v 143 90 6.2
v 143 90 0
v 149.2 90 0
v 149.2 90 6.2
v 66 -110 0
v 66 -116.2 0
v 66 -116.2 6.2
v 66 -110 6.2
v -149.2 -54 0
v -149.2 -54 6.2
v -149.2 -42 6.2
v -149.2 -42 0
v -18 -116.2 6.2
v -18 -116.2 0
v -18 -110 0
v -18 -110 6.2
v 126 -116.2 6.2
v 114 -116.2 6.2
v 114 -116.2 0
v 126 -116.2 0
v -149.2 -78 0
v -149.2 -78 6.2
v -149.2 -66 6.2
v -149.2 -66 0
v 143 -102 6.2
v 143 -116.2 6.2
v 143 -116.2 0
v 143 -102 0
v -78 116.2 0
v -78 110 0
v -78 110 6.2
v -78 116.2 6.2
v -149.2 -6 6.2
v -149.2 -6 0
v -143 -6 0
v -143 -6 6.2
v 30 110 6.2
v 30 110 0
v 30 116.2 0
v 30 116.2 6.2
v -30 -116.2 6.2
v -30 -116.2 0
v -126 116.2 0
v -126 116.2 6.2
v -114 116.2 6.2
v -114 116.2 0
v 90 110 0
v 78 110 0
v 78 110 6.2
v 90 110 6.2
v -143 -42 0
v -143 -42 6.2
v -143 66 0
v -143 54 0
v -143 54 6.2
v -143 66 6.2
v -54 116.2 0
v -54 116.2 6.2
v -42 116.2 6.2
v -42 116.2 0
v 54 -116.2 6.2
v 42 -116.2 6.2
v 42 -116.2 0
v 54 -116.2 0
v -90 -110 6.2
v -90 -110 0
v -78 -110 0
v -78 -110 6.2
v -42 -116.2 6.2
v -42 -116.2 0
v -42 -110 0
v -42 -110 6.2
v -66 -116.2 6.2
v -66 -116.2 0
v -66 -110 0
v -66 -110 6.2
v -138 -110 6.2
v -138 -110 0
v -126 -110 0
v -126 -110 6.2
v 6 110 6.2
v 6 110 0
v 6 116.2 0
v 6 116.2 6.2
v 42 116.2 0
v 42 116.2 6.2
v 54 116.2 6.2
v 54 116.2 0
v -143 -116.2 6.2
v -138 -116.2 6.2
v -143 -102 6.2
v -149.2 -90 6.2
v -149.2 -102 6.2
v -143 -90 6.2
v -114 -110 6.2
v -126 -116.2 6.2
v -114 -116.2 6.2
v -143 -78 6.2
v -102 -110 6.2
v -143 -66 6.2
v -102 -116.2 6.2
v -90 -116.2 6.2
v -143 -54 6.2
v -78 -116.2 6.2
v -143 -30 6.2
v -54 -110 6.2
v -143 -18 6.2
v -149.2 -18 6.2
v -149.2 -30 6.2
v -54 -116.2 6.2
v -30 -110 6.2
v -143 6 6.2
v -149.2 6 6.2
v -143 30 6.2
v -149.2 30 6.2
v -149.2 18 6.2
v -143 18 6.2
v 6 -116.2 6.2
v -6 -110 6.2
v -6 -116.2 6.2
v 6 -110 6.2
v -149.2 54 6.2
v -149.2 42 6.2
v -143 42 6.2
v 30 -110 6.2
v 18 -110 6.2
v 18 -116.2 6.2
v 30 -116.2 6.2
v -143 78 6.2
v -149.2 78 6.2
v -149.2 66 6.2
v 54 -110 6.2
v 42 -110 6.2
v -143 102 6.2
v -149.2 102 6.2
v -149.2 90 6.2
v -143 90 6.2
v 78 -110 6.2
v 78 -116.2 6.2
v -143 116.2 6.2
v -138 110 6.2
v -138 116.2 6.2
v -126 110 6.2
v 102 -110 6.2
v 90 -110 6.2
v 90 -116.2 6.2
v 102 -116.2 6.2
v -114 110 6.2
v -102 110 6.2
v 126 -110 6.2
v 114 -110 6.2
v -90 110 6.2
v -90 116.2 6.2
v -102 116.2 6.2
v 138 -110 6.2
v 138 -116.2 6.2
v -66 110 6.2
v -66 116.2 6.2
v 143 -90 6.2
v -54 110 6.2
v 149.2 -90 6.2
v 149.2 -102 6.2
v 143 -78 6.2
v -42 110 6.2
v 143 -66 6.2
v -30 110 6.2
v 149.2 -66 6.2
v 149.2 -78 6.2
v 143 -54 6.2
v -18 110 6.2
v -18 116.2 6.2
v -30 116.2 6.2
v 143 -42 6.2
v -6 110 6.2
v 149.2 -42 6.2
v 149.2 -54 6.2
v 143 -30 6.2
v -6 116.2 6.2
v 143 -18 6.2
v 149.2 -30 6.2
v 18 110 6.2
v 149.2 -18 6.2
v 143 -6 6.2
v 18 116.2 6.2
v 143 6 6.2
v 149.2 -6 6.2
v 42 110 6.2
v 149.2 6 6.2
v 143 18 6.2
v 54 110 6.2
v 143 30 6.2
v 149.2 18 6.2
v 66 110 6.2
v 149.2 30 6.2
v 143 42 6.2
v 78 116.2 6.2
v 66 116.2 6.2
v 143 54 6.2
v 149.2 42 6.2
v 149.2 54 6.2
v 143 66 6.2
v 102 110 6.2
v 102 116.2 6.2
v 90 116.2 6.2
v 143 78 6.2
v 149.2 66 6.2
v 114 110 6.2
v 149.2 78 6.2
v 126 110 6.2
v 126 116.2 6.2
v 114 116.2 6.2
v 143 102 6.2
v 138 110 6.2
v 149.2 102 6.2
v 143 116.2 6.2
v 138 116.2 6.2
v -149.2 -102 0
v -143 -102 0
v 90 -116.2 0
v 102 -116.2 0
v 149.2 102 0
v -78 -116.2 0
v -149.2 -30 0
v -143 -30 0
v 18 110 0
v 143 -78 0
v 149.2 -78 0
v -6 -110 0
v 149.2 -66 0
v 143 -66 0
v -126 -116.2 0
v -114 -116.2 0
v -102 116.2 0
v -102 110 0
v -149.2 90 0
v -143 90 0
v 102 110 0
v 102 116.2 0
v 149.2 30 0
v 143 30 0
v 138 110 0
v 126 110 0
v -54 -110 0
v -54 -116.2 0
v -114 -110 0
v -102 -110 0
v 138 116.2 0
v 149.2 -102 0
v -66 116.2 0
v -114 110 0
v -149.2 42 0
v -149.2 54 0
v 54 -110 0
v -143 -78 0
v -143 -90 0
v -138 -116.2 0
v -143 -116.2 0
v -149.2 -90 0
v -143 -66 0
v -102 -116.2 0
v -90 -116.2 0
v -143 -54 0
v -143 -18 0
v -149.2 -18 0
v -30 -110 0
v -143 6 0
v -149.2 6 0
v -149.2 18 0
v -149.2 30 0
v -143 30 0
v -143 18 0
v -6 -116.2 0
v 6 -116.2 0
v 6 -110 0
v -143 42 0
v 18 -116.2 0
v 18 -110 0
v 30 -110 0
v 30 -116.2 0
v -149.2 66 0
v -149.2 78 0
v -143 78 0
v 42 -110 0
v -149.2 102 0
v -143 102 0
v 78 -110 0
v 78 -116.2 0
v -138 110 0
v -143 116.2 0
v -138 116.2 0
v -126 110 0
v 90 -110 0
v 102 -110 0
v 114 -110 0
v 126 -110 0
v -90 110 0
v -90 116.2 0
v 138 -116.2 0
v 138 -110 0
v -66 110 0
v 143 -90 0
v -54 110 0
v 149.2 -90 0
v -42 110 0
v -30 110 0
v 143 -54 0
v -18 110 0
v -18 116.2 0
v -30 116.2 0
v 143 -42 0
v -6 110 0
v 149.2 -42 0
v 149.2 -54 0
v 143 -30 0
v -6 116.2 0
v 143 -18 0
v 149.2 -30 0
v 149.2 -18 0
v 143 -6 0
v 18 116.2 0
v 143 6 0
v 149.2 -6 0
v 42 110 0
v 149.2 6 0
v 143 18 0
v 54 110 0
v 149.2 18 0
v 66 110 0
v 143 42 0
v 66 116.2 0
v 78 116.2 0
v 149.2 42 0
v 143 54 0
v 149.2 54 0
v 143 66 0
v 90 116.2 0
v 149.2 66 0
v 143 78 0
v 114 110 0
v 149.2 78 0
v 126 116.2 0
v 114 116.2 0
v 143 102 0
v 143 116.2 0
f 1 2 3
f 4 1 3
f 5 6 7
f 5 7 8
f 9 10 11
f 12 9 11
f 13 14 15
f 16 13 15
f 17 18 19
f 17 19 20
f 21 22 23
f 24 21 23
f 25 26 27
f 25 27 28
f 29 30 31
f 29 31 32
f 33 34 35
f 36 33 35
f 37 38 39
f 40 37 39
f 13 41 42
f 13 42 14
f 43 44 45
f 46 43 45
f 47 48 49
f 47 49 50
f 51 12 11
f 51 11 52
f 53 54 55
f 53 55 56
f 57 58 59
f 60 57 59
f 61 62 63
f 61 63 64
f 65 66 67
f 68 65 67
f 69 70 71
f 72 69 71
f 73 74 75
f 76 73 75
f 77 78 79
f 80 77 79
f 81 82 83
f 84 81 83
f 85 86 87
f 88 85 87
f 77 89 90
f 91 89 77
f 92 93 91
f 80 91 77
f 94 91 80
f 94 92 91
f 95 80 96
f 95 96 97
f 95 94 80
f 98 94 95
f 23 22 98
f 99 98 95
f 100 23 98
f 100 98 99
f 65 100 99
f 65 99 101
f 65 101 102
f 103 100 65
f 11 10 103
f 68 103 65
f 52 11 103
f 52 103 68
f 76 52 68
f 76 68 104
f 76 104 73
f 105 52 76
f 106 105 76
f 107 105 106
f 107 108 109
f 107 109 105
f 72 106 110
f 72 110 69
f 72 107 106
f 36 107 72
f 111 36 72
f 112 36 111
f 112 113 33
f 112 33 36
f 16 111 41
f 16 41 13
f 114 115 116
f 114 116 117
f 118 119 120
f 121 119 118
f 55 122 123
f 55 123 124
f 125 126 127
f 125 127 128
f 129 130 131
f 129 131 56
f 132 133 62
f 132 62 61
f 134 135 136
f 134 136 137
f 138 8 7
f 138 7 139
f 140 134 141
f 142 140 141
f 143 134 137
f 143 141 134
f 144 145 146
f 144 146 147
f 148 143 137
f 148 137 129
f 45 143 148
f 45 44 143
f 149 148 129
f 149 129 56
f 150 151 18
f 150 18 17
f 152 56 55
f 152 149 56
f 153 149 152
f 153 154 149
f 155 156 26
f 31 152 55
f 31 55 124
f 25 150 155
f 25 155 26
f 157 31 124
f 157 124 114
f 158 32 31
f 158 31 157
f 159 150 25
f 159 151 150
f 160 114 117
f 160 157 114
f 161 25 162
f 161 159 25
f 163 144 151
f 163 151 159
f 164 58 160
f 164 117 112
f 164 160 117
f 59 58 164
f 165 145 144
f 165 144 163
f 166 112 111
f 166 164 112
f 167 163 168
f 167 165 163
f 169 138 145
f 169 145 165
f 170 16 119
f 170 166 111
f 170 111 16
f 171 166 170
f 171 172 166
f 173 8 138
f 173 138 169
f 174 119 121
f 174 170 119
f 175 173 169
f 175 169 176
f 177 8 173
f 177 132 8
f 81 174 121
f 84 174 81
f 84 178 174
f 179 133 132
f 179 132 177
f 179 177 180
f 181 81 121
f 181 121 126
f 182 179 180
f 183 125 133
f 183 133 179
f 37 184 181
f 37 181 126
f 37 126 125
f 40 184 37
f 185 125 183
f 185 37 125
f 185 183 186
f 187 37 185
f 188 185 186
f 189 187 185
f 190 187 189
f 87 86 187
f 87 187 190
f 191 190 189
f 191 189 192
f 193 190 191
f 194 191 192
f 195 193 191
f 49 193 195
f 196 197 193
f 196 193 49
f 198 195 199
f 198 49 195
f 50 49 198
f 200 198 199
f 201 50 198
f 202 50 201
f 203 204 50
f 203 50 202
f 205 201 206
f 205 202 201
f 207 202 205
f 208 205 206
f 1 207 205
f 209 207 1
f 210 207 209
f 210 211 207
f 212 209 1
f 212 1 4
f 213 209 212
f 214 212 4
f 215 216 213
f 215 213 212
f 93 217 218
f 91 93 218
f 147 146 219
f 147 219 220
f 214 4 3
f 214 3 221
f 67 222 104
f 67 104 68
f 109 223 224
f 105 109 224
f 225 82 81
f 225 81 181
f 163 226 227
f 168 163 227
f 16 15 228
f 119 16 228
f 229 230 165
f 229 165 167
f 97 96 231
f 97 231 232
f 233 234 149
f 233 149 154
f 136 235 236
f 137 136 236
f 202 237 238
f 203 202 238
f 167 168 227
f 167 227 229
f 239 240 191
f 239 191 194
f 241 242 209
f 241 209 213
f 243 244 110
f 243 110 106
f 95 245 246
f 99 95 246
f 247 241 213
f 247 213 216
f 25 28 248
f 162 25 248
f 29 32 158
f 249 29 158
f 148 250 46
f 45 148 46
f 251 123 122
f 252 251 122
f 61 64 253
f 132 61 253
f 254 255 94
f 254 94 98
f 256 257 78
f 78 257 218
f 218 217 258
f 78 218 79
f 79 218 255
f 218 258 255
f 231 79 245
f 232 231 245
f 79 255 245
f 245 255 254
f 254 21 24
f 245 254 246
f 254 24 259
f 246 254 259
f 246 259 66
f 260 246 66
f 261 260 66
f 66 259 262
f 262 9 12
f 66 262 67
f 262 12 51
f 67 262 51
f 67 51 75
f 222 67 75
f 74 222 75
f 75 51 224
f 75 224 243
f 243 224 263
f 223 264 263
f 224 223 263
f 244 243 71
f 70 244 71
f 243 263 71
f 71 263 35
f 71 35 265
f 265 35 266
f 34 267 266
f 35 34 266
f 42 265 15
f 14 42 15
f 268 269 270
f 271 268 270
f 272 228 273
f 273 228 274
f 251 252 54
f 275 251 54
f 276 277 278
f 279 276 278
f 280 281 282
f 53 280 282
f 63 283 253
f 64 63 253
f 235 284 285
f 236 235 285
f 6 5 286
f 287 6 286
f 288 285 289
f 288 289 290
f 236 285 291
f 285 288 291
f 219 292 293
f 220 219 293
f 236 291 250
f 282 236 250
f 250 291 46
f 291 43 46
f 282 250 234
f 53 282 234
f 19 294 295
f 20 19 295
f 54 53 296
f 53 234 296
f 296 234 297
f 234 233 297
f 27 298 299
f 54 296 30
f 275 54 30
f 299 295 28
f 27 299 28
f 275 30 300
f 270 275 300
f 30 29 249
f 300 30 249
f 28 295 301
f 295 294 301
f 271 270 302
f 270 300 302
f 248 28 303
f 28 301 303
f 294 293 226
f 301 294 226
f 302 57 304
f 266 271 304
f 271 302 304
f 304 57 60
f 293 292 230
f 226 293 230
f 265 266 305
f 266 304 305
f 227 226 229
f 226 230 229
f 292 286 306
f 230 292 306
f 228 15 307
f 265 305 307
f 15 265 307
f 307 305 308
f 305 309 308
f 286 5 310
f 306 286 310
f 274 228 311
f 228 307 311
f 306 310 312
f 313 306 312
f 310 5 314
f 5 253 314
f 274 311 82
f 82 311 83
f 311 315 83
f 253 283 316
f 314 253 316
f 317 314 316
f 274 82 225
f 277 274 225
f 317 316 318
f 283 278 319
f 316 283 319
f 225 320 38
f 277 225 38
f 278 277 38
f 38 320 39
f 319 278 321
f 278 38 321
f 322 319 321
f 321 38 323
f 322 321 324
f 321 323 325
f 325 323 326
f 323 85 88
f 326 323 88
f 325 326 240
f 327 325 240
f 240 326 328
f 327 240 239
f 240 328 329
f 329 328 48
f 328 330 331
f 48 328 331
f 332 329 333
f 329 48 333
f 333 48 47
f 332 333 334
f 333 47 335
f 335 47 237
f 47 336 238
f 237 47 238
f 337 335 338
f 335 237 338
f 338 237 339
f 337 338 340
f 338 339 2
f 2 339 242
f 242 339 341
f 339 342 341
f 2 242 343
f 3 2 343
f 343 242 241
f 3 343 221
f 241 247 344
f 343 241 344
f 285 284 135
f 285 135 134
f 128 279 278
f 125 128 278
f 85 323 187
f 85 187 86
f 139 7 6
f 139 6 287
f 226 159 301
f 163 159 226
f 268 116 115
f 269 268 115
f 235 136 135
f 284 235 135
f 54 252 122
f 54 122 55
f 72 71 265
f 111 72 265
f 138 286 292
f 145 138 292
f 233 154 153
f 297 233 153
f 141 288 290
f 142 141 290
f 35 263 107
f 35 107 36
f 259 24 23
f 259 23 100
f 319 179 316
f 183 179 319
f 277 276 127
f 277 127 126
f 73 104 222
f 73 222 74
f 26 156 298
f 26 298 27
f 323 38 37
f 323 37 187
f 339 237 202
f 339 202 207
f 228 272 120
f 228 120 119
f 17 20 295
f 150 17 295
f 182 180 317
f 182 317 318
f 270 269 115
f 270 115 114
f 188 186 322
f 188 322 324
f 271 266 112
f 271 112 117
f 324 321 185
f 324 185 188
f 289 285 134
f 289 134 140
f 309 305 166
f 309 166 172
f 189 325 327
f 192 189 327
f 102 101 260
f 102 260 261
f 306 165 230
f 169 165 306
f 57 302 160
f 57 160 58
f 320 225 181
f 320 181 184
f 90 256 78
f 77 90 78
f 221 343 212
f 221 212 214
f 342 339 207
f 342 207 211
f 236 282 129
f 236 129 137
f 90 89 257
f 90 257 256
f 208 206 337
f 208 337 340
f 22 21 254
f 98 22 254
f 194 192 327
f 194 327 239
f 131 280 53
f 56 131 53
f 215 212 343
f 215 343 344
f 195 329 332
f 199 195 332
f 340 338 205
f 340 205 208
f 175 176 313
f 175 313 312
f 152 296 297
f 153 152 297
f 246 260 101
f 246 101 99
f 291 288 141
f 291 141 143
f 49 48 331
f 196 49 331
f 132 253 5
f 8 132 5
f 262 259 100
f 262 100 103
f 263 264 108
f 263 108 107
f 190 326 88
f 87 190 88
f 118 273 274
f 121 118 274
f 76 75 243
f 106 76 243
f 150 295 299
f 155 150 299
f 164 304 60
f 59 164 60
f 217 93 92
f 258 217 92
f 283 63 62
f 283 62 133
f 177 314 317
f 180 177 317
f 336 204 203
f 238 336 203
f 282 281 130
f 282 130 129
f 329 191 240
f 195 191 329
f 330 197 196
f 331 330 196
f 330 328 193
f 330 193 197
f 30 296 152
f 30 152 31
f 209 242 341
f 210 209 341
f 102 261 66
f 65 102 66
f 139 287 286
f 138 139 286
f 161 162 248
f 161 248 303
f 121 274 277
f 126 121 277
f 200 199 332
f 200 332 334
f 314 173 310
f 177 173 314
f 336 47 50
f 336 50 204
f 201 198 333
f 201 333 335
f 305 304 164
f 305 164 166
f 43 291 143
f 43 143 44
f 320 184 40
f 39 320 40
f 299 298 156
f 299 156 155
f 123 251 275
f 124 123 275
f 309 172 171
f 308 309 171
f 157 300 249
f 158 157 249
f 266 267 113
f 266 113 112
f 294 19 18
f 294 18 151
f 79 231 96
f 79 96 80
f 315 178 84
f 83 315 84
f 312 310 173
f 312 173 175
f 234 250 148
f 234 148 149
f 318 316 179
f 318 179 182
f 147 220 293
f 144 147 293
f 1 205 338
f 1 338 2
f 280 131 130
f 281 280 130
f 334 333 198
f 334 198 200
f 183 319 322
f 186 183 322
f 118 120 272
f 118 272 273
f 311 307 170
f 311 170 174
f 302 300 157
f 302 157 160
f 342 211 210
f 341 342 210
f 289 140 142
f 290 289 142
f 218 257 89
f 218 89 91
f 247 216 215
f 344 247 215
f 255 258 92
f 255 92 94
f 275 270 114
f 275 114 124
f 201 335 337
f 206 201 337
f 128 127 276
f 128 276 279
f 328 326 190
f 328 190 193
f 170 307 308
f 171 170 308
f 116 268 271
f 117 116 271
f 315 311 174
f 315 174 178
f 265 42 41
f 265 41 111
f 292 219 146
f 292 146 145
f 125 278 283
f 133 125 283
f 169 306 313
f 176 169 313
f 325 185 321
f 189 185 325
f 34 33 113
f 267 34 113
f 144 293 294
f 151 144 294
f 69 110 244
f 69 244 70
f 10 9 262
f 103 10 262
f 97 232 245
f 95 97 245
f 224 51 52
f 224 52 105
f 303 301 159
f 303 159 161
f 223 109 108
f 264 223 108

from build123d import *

# Parameters (mm, degrees)
F0_W     = 286
F0_H     = 220
F1_DEPTH = 6.2
F2_W     = 5
F2_H     = 6.2
F2_W_2   = 12
F3_DEPTH = 6.2
F4_W     = 6.2
F4_H     = 12
F5_DEPTH = 6.2


with BuildPart() as f1:
    # F0 (on Top) → F1 (new body)
    with BuildSketch(Plane.XY):
        Rectangle(F0_W, F0_H)
    extrude(amount=F1_DEPTH)

    # F2 (on face) → F3 (join, through all)
    with BuildSketch(Plane.XY.offset(6.2)):
        with Locations((140.5, 113.1)):
            Rectangle(F2_W, F2_H)
        with Locations((120, 113.1)):
            Rectangle(F2_W_2, F2_H)
        with Locations((96, 113.1)):
            Rectangle(F2_W_2, F2_H)
        with Locations((72, 113.1)):
            Rectangle(F2_W_2, F2_H)
        with Locations((48, 113.1)):
            Rectangle(F2_W_2, F2_H)
        with Locations((24, 113.1)):
            Rectangle(F2_W_2, F2_H)
        with Locations((0, 113.1)):
            Rectangle(F2_W_2, F2_H)
        with Locations((-24, 113.1)):
            Rectangle(F2_W_2, F2_H)
        with Locations((-48, 113.1)):
            Rectangle(F2_W_2, F2_H)
        with Locations((-72, 113.1)):
            Rectangle(F2_W_2, F2_H)
        with Locations((-96, 113.1)):
            Rectangle(F2_W_2, F2_H)
        with Locations((-120, 113.1)):
            Rectangle(F2_W_2, F2_H)
        with Locations((-140.5, 113.1)):
            Rectangle(F2_W, F2_H)
        with Locations((-140.5, -113.1)):
            Rectangle(F2_W, F2_H)
        with Locations((-120, -113.1)):
            Rectangle(F2_W_2, F2_H)
        with Locations((-96, -113.1)):
            Rectangle(F2_W_2, F2_H)
        with Locations((-72, -113.1)):
            Rectangle(F2_W_2, F2_H)
        with Locations((-48, -113.1)):
            Rectangle(F2_W_2, F2_H)
        with Locations((-24, -113.1)):
            Rectangle(F2_W_2, F2_H)
        with Locations((0, -113.1)):
            Rectangle(F2_W_2, F2_H)
        with Locations((24, -113.1)):
            Rectangle(F2_W_2, F2_H)
        with Locations((48, -113.1)):
            Rectangle(F2_W_2, F2_H)
        with Locations((72, -113.1)):
            Rectangle(F2_W_2, F2_H)
        with Locations((96, -113.1)):
            Rectangle(F2_W_2, F2_H)
        with Locations((120, -113.1)):
            Rectangle(F2_W_2, F2_H)
        with Locations((140.5, -113.1)):
            Rectangle(F2_W, F2_H)
    extrude(amount=-F3_DEPTH)

    # F4 (on face) → F5 (join, through all)
    with BuildSketch(Plane.XY.offset(6.2)):
        with Locations((146.1, -96)):
            Rectangle(F4_W, F4_H)
        with Locations((146.1, -72)):
            Rectangle(F4_W, F4_H)
        with Locations((146.1, -48)):
            Rectangle(F4_W, F4_H)
        with Locations((146.1, -24)):
            Rectangle(F4_W, F4_H)
        with Locations((146.1, 0)):
            Rectangle(F4_W, F4_H)
        with Locations((146.1, 24)):
            Rectangle(F4_W, F4_H)
        with Locations((146.1, 48)):
            Rectangle(F4_W, F4_H)
        with Locations((146.1, 72)):
            Rectangle(F4_W, F4_H)
        with Locations((146.1, 96)):
            Rectangle(F4_W, F4_H)
        with Locations((-146.1, 96)):
            Rectangle(F4_W, F4_H)
        with Locations((-146.1, 72)):
            Rectangle(F4_W, F4_H)
        with Locations((-146.1, 48)):
            Rectangle(F4_W, F4_H)
        with Locations((-146.1, 24)):
            Rectangle(F4_W, F4_H)
        with Locations((-146.1, 0)):
            Rectangle(F4_W, F4_H)
        with Locations((-146.1, -24)):
            Rectangle(F4_W, F4_H)
        with Locations((-146.1, -48)):
            Rectangle(F4_W, F4_H)
        with Locations((-146.1, -72)):
            Rectangle(F4_W, F4_H)
        with Locations((-146.1, -96)):
            Rectangle(F4_W, F4_H)
    extrude(amount=-F5_DEPTH)


solid = f1.part
